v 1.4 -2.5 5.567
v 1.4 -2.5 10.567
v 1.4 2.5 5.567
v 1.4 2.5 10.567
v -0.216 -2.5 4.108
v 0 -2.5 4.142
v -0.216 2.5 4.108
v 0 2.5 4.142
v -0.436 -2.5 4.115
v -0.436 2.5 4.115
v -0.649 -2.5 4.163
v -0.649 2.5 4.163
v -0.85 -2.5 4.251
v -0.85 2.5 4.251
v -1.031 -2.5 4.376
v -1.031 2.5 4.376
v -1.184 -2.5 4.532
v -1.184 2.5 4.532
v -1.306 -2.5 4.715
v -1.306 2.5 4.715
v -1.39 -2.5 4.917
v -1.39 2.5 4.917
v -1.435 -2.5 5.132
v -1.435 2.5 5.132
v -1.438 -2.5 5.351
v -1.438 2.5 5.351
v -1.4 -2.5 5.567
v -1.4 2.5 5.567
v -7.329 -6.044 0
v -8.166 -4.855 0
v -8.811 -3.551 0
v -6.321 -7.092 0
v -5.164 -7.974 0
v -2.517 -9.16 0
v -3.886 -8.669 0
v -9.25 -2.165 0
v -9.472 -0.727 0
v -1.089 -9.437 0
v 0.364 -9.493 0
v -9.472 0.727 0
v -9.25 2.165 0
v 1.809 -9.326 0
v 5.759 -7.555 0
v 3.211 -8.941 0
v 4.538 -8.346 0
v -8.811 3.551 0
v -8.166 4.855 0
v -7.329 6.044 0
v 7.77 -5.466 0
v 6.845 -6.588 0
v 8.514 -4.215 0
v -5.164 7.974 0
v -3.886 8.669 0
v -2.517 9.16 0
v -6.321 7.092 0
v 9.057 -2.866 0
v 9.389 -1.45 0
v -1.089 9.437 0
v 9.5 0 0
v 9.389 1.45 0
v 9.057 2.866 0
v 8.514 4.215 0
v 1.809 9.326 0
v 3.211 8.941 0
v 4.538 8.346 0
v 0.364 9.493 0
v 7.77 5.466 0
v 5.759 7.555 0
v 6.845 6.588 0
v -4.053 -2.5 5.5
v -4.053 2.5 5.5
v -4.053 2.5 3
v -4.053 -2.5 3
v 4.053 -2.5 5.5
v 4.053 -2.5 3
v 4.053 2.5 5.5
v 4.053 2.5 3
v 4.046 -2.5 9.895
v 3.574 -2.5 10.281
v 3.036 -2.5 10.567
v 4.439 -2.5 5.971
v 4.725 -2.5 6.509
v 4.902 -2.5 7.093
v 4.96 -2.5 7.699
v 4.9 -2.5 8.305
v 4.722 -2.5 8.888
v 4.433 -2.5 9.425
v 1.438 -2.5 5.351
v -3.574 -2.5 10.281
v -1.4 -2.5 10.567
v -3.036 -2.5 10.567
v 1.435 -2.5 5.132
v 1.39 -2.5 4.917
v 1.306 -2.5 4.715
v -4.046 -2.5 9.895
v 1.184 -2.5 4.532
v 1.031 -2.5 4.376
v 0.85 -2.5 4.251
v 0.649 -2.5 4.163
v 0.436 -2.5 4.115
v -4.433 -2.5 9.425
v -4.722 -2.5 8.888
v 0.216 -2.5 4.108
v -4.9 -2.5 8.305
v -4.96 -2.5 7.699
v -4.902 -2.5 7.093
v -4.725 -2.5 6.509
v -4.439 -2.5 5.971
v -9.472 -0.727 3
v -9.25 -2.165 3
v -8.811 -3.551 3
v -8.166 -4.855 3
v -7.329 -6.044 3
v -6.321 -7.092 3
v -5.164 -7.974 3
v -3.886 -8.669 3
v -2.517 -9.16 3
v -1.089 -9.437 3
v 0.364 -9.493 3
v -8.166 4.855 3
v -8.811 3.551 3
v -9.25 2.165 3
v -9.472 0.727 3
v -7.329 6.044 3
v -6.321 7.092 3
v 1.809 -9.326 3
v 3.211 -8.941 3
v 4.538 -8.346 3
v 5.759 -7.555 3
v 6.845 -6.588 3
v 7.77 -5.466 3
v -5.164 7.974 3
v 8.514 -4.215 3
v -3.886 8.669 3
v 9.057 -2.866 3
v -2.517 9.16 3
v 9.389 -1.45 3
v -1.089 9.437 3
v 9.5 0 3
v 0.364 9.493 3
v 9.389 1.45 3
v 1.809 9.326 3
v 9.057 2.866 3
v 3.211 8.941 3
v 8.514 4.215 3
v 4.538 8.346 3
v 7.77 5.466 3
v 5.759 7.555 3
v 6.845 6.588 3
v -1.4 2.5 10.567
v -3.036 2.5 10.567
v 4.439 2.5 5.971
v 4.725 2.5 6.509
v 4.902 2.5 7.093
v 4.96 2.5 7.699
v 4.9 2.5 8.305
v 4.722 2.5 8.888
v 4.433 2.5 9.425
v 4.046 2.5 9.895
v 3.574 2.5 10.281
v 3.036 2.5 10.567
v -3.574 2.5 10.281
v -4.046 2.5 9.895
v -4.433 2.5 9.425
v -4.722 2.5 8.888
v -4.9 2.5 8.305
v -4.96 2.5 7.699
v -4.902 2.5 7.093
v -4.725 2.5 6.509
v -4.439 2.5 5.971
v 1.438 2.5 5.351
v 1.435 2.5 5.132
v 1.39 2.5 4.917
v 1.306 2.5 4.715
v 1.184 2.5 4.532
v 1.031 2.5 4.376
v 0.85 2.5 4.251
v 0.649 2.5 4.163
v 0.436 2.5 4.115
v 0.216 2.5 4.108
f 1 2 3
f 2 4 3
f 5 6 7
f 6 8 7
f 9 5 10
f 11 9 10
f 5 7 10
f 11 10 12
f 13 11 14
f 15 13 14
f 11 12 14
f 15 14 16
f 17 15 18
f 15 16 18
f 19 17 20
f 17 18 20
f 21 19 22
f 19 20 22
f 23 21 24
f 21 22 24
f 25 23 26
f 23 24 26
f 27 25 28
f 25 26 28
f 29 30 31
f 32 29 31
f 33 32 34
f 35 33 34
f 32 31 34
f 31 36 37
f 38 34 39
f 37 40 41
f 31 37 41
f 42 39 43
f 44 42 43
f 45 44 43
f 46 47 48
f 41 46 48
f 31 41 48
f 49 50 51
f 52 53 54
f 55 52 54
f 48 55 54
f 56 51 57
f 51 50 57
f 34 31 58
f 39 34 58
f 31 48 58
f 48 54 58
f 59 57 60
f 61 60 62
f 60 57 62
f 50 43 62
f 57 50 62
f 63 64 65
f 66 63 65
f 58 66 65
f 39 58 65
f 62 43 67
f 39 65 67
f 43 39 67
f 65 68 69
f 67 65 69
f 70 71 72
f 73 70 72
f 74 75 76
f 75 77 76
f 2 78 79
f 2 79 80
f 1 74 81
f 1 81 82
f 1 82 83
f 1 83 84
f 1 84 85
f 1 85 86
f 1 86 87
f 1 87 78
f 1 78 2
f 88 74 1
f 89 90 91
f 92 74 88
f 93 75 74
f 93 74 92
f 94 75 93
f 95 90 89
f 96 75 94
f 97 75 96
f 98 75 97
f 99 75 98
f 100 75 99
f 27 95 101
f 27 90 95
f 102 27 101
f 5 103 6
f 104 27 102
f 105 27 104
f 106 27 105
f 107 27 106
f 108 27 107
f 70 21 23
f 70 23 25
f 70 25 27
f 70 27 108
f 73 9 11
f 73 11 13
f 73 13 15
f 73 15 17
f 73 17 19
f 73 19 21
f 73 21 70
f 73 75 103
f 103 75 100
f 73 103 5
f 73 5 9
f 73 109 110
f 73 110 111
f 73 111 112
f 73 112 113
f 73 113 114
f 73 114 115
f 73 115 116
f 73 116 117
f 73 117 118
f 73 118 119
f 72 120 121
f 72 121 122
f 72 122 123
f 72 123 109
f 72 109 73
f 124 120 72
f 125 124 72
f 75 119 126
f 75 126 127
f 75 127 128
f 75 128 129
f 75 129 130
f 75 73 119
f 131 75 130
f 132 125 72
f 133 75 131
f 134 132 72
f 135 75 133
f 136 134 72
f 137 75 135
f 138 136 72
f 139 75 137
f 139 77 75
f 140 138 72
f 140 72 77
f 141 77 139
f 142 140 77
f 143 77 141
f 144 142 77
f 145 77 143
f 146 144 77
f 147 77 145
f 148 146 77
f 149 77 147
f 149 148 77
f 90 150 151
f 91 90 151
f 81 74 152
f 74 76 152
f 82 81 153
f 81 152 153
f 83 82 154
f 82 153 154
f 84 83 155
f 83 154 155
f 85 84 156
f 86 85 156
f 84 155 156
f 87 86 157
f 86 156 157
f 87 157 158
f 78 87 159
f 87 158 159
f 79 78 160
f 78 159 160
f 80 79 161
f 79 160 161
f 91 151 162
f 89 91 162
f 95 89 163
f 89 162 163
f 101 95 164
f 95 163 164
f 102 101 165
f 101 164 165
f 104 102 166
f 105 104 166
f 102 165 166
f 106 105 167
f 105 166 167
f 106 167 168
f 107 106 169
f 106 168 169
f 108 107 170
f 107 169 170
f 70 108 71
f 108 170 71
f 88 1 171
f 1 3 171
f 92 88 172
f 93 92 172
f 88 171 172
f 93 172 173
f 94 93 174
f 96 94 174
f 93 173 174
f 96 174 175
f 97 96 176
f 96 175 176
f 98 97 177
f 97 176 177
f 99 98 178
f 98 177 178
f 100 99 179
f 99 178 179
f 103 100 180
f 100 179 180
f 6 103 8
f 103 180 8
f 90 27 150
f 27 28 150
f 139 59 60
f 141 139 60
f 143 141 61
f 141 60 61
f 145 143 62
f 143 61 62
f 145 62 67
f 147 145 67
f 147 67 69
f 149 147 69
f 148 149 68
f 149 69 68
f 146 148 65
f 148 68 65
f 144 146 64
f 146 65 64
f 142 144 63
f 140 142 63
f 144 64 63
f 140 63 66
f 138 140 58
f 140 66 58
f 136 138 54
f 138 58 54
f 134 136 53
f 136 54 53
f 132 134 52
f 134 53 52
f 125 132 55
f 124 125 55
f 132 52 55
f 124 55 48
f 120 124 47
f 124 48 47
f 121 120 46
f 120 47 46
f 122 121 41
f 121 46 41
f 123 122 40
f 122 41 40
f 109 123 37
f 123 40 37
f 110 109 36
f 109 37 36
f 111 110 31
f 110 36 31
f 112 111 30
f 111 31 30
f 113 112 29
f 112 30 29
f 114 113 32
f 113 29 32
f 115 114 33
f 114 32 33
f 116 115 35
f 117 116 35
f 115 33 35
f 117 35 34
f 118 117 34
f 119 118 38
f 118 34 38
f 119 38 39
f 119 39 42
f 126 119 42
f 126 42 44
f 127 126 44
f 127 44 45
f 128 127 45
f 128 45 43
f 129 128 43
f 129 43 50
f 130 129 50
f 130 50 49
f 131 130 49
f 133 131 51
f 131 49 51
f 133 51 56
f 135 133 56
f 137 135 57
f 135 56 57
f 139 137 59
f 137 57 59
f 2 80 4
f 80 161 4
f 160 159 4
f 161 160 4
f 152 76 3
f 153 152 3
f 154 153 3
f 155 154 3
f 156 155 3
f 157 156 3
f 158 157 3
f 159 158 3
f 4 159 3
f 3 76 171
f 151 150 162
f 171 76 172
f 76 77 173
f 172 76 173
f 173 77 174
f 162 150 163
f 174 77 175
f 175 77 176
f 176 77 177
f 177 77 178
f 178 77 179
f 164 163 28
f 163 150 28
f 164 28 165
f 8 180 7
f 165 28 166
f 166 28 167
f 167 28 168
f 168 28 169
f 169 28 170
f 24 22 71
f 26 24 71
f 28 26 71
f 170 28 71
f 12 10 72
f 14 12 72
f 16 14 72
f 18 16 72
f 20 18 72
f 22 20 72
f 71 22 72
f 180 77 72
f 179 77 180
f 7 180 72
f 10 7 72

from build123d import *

# Parameters (mm, degrees)
SKETCH1_R           = 9.5
BOSS_EXTRUDE1_DEPTH = 3
BOSS_EXTRUDE2_DEPTH = 2.5


with BuildPart() as part:
    # Sketch1 → Boss-Extrude1 (new body)
    with BuildSketch(Plane.XY):
        Circle(SKETCH1_R)
    extrude(amount=BOSS_EXTRUDE1_DEPTH)

    # Sketch3 → Boss-Extrude2 (add, symmetric)
    with BuildSketch(Plane(origin=(0, 0, 0), x_dir=(1, 0, 0), z_dir=(0, 1, 0))):
        with BuildLine():
            Line((-4.053033857, -5.5), (-4.053033857, -3))
            Line((-4.053033857, -3), (4.053033857, -3))
            Line((4.053033857, -3), (4.053033857, -5.5))
            ThreePointArc((4.053033857, -5.5), (4.899562702, -8.305363596), (3.036123017, -10.566838454))
            Line((3.036123017, -10.566838454), (1.4, -10.566838454))
            Line((1.4, -10.566838454), (1.4, -5.566838454))
            ThreePointArc((1.4, -5.566838454), (1.111291087, -4.450394141), (0, -4.142444699))
            ThreePointArc((0, -4.142444699), (-1.111291087, -4.450394141), (-1.4, -5.566838454))
            Line((-1.4, -5.566838454), (-1.4, -10.566838454))
            Line((-1.4, -10.566838454), (-3.036123017, -10.566838454))
            ThreePointArc((-3.036123017, -10.566838454), (-4.899562702, -8.305363596), (-4.053033857, -5.5))
        make_face()
    extrude(amount=BOSS_EXTRUDE2_DEPTH, both=True)


solid = part.part
